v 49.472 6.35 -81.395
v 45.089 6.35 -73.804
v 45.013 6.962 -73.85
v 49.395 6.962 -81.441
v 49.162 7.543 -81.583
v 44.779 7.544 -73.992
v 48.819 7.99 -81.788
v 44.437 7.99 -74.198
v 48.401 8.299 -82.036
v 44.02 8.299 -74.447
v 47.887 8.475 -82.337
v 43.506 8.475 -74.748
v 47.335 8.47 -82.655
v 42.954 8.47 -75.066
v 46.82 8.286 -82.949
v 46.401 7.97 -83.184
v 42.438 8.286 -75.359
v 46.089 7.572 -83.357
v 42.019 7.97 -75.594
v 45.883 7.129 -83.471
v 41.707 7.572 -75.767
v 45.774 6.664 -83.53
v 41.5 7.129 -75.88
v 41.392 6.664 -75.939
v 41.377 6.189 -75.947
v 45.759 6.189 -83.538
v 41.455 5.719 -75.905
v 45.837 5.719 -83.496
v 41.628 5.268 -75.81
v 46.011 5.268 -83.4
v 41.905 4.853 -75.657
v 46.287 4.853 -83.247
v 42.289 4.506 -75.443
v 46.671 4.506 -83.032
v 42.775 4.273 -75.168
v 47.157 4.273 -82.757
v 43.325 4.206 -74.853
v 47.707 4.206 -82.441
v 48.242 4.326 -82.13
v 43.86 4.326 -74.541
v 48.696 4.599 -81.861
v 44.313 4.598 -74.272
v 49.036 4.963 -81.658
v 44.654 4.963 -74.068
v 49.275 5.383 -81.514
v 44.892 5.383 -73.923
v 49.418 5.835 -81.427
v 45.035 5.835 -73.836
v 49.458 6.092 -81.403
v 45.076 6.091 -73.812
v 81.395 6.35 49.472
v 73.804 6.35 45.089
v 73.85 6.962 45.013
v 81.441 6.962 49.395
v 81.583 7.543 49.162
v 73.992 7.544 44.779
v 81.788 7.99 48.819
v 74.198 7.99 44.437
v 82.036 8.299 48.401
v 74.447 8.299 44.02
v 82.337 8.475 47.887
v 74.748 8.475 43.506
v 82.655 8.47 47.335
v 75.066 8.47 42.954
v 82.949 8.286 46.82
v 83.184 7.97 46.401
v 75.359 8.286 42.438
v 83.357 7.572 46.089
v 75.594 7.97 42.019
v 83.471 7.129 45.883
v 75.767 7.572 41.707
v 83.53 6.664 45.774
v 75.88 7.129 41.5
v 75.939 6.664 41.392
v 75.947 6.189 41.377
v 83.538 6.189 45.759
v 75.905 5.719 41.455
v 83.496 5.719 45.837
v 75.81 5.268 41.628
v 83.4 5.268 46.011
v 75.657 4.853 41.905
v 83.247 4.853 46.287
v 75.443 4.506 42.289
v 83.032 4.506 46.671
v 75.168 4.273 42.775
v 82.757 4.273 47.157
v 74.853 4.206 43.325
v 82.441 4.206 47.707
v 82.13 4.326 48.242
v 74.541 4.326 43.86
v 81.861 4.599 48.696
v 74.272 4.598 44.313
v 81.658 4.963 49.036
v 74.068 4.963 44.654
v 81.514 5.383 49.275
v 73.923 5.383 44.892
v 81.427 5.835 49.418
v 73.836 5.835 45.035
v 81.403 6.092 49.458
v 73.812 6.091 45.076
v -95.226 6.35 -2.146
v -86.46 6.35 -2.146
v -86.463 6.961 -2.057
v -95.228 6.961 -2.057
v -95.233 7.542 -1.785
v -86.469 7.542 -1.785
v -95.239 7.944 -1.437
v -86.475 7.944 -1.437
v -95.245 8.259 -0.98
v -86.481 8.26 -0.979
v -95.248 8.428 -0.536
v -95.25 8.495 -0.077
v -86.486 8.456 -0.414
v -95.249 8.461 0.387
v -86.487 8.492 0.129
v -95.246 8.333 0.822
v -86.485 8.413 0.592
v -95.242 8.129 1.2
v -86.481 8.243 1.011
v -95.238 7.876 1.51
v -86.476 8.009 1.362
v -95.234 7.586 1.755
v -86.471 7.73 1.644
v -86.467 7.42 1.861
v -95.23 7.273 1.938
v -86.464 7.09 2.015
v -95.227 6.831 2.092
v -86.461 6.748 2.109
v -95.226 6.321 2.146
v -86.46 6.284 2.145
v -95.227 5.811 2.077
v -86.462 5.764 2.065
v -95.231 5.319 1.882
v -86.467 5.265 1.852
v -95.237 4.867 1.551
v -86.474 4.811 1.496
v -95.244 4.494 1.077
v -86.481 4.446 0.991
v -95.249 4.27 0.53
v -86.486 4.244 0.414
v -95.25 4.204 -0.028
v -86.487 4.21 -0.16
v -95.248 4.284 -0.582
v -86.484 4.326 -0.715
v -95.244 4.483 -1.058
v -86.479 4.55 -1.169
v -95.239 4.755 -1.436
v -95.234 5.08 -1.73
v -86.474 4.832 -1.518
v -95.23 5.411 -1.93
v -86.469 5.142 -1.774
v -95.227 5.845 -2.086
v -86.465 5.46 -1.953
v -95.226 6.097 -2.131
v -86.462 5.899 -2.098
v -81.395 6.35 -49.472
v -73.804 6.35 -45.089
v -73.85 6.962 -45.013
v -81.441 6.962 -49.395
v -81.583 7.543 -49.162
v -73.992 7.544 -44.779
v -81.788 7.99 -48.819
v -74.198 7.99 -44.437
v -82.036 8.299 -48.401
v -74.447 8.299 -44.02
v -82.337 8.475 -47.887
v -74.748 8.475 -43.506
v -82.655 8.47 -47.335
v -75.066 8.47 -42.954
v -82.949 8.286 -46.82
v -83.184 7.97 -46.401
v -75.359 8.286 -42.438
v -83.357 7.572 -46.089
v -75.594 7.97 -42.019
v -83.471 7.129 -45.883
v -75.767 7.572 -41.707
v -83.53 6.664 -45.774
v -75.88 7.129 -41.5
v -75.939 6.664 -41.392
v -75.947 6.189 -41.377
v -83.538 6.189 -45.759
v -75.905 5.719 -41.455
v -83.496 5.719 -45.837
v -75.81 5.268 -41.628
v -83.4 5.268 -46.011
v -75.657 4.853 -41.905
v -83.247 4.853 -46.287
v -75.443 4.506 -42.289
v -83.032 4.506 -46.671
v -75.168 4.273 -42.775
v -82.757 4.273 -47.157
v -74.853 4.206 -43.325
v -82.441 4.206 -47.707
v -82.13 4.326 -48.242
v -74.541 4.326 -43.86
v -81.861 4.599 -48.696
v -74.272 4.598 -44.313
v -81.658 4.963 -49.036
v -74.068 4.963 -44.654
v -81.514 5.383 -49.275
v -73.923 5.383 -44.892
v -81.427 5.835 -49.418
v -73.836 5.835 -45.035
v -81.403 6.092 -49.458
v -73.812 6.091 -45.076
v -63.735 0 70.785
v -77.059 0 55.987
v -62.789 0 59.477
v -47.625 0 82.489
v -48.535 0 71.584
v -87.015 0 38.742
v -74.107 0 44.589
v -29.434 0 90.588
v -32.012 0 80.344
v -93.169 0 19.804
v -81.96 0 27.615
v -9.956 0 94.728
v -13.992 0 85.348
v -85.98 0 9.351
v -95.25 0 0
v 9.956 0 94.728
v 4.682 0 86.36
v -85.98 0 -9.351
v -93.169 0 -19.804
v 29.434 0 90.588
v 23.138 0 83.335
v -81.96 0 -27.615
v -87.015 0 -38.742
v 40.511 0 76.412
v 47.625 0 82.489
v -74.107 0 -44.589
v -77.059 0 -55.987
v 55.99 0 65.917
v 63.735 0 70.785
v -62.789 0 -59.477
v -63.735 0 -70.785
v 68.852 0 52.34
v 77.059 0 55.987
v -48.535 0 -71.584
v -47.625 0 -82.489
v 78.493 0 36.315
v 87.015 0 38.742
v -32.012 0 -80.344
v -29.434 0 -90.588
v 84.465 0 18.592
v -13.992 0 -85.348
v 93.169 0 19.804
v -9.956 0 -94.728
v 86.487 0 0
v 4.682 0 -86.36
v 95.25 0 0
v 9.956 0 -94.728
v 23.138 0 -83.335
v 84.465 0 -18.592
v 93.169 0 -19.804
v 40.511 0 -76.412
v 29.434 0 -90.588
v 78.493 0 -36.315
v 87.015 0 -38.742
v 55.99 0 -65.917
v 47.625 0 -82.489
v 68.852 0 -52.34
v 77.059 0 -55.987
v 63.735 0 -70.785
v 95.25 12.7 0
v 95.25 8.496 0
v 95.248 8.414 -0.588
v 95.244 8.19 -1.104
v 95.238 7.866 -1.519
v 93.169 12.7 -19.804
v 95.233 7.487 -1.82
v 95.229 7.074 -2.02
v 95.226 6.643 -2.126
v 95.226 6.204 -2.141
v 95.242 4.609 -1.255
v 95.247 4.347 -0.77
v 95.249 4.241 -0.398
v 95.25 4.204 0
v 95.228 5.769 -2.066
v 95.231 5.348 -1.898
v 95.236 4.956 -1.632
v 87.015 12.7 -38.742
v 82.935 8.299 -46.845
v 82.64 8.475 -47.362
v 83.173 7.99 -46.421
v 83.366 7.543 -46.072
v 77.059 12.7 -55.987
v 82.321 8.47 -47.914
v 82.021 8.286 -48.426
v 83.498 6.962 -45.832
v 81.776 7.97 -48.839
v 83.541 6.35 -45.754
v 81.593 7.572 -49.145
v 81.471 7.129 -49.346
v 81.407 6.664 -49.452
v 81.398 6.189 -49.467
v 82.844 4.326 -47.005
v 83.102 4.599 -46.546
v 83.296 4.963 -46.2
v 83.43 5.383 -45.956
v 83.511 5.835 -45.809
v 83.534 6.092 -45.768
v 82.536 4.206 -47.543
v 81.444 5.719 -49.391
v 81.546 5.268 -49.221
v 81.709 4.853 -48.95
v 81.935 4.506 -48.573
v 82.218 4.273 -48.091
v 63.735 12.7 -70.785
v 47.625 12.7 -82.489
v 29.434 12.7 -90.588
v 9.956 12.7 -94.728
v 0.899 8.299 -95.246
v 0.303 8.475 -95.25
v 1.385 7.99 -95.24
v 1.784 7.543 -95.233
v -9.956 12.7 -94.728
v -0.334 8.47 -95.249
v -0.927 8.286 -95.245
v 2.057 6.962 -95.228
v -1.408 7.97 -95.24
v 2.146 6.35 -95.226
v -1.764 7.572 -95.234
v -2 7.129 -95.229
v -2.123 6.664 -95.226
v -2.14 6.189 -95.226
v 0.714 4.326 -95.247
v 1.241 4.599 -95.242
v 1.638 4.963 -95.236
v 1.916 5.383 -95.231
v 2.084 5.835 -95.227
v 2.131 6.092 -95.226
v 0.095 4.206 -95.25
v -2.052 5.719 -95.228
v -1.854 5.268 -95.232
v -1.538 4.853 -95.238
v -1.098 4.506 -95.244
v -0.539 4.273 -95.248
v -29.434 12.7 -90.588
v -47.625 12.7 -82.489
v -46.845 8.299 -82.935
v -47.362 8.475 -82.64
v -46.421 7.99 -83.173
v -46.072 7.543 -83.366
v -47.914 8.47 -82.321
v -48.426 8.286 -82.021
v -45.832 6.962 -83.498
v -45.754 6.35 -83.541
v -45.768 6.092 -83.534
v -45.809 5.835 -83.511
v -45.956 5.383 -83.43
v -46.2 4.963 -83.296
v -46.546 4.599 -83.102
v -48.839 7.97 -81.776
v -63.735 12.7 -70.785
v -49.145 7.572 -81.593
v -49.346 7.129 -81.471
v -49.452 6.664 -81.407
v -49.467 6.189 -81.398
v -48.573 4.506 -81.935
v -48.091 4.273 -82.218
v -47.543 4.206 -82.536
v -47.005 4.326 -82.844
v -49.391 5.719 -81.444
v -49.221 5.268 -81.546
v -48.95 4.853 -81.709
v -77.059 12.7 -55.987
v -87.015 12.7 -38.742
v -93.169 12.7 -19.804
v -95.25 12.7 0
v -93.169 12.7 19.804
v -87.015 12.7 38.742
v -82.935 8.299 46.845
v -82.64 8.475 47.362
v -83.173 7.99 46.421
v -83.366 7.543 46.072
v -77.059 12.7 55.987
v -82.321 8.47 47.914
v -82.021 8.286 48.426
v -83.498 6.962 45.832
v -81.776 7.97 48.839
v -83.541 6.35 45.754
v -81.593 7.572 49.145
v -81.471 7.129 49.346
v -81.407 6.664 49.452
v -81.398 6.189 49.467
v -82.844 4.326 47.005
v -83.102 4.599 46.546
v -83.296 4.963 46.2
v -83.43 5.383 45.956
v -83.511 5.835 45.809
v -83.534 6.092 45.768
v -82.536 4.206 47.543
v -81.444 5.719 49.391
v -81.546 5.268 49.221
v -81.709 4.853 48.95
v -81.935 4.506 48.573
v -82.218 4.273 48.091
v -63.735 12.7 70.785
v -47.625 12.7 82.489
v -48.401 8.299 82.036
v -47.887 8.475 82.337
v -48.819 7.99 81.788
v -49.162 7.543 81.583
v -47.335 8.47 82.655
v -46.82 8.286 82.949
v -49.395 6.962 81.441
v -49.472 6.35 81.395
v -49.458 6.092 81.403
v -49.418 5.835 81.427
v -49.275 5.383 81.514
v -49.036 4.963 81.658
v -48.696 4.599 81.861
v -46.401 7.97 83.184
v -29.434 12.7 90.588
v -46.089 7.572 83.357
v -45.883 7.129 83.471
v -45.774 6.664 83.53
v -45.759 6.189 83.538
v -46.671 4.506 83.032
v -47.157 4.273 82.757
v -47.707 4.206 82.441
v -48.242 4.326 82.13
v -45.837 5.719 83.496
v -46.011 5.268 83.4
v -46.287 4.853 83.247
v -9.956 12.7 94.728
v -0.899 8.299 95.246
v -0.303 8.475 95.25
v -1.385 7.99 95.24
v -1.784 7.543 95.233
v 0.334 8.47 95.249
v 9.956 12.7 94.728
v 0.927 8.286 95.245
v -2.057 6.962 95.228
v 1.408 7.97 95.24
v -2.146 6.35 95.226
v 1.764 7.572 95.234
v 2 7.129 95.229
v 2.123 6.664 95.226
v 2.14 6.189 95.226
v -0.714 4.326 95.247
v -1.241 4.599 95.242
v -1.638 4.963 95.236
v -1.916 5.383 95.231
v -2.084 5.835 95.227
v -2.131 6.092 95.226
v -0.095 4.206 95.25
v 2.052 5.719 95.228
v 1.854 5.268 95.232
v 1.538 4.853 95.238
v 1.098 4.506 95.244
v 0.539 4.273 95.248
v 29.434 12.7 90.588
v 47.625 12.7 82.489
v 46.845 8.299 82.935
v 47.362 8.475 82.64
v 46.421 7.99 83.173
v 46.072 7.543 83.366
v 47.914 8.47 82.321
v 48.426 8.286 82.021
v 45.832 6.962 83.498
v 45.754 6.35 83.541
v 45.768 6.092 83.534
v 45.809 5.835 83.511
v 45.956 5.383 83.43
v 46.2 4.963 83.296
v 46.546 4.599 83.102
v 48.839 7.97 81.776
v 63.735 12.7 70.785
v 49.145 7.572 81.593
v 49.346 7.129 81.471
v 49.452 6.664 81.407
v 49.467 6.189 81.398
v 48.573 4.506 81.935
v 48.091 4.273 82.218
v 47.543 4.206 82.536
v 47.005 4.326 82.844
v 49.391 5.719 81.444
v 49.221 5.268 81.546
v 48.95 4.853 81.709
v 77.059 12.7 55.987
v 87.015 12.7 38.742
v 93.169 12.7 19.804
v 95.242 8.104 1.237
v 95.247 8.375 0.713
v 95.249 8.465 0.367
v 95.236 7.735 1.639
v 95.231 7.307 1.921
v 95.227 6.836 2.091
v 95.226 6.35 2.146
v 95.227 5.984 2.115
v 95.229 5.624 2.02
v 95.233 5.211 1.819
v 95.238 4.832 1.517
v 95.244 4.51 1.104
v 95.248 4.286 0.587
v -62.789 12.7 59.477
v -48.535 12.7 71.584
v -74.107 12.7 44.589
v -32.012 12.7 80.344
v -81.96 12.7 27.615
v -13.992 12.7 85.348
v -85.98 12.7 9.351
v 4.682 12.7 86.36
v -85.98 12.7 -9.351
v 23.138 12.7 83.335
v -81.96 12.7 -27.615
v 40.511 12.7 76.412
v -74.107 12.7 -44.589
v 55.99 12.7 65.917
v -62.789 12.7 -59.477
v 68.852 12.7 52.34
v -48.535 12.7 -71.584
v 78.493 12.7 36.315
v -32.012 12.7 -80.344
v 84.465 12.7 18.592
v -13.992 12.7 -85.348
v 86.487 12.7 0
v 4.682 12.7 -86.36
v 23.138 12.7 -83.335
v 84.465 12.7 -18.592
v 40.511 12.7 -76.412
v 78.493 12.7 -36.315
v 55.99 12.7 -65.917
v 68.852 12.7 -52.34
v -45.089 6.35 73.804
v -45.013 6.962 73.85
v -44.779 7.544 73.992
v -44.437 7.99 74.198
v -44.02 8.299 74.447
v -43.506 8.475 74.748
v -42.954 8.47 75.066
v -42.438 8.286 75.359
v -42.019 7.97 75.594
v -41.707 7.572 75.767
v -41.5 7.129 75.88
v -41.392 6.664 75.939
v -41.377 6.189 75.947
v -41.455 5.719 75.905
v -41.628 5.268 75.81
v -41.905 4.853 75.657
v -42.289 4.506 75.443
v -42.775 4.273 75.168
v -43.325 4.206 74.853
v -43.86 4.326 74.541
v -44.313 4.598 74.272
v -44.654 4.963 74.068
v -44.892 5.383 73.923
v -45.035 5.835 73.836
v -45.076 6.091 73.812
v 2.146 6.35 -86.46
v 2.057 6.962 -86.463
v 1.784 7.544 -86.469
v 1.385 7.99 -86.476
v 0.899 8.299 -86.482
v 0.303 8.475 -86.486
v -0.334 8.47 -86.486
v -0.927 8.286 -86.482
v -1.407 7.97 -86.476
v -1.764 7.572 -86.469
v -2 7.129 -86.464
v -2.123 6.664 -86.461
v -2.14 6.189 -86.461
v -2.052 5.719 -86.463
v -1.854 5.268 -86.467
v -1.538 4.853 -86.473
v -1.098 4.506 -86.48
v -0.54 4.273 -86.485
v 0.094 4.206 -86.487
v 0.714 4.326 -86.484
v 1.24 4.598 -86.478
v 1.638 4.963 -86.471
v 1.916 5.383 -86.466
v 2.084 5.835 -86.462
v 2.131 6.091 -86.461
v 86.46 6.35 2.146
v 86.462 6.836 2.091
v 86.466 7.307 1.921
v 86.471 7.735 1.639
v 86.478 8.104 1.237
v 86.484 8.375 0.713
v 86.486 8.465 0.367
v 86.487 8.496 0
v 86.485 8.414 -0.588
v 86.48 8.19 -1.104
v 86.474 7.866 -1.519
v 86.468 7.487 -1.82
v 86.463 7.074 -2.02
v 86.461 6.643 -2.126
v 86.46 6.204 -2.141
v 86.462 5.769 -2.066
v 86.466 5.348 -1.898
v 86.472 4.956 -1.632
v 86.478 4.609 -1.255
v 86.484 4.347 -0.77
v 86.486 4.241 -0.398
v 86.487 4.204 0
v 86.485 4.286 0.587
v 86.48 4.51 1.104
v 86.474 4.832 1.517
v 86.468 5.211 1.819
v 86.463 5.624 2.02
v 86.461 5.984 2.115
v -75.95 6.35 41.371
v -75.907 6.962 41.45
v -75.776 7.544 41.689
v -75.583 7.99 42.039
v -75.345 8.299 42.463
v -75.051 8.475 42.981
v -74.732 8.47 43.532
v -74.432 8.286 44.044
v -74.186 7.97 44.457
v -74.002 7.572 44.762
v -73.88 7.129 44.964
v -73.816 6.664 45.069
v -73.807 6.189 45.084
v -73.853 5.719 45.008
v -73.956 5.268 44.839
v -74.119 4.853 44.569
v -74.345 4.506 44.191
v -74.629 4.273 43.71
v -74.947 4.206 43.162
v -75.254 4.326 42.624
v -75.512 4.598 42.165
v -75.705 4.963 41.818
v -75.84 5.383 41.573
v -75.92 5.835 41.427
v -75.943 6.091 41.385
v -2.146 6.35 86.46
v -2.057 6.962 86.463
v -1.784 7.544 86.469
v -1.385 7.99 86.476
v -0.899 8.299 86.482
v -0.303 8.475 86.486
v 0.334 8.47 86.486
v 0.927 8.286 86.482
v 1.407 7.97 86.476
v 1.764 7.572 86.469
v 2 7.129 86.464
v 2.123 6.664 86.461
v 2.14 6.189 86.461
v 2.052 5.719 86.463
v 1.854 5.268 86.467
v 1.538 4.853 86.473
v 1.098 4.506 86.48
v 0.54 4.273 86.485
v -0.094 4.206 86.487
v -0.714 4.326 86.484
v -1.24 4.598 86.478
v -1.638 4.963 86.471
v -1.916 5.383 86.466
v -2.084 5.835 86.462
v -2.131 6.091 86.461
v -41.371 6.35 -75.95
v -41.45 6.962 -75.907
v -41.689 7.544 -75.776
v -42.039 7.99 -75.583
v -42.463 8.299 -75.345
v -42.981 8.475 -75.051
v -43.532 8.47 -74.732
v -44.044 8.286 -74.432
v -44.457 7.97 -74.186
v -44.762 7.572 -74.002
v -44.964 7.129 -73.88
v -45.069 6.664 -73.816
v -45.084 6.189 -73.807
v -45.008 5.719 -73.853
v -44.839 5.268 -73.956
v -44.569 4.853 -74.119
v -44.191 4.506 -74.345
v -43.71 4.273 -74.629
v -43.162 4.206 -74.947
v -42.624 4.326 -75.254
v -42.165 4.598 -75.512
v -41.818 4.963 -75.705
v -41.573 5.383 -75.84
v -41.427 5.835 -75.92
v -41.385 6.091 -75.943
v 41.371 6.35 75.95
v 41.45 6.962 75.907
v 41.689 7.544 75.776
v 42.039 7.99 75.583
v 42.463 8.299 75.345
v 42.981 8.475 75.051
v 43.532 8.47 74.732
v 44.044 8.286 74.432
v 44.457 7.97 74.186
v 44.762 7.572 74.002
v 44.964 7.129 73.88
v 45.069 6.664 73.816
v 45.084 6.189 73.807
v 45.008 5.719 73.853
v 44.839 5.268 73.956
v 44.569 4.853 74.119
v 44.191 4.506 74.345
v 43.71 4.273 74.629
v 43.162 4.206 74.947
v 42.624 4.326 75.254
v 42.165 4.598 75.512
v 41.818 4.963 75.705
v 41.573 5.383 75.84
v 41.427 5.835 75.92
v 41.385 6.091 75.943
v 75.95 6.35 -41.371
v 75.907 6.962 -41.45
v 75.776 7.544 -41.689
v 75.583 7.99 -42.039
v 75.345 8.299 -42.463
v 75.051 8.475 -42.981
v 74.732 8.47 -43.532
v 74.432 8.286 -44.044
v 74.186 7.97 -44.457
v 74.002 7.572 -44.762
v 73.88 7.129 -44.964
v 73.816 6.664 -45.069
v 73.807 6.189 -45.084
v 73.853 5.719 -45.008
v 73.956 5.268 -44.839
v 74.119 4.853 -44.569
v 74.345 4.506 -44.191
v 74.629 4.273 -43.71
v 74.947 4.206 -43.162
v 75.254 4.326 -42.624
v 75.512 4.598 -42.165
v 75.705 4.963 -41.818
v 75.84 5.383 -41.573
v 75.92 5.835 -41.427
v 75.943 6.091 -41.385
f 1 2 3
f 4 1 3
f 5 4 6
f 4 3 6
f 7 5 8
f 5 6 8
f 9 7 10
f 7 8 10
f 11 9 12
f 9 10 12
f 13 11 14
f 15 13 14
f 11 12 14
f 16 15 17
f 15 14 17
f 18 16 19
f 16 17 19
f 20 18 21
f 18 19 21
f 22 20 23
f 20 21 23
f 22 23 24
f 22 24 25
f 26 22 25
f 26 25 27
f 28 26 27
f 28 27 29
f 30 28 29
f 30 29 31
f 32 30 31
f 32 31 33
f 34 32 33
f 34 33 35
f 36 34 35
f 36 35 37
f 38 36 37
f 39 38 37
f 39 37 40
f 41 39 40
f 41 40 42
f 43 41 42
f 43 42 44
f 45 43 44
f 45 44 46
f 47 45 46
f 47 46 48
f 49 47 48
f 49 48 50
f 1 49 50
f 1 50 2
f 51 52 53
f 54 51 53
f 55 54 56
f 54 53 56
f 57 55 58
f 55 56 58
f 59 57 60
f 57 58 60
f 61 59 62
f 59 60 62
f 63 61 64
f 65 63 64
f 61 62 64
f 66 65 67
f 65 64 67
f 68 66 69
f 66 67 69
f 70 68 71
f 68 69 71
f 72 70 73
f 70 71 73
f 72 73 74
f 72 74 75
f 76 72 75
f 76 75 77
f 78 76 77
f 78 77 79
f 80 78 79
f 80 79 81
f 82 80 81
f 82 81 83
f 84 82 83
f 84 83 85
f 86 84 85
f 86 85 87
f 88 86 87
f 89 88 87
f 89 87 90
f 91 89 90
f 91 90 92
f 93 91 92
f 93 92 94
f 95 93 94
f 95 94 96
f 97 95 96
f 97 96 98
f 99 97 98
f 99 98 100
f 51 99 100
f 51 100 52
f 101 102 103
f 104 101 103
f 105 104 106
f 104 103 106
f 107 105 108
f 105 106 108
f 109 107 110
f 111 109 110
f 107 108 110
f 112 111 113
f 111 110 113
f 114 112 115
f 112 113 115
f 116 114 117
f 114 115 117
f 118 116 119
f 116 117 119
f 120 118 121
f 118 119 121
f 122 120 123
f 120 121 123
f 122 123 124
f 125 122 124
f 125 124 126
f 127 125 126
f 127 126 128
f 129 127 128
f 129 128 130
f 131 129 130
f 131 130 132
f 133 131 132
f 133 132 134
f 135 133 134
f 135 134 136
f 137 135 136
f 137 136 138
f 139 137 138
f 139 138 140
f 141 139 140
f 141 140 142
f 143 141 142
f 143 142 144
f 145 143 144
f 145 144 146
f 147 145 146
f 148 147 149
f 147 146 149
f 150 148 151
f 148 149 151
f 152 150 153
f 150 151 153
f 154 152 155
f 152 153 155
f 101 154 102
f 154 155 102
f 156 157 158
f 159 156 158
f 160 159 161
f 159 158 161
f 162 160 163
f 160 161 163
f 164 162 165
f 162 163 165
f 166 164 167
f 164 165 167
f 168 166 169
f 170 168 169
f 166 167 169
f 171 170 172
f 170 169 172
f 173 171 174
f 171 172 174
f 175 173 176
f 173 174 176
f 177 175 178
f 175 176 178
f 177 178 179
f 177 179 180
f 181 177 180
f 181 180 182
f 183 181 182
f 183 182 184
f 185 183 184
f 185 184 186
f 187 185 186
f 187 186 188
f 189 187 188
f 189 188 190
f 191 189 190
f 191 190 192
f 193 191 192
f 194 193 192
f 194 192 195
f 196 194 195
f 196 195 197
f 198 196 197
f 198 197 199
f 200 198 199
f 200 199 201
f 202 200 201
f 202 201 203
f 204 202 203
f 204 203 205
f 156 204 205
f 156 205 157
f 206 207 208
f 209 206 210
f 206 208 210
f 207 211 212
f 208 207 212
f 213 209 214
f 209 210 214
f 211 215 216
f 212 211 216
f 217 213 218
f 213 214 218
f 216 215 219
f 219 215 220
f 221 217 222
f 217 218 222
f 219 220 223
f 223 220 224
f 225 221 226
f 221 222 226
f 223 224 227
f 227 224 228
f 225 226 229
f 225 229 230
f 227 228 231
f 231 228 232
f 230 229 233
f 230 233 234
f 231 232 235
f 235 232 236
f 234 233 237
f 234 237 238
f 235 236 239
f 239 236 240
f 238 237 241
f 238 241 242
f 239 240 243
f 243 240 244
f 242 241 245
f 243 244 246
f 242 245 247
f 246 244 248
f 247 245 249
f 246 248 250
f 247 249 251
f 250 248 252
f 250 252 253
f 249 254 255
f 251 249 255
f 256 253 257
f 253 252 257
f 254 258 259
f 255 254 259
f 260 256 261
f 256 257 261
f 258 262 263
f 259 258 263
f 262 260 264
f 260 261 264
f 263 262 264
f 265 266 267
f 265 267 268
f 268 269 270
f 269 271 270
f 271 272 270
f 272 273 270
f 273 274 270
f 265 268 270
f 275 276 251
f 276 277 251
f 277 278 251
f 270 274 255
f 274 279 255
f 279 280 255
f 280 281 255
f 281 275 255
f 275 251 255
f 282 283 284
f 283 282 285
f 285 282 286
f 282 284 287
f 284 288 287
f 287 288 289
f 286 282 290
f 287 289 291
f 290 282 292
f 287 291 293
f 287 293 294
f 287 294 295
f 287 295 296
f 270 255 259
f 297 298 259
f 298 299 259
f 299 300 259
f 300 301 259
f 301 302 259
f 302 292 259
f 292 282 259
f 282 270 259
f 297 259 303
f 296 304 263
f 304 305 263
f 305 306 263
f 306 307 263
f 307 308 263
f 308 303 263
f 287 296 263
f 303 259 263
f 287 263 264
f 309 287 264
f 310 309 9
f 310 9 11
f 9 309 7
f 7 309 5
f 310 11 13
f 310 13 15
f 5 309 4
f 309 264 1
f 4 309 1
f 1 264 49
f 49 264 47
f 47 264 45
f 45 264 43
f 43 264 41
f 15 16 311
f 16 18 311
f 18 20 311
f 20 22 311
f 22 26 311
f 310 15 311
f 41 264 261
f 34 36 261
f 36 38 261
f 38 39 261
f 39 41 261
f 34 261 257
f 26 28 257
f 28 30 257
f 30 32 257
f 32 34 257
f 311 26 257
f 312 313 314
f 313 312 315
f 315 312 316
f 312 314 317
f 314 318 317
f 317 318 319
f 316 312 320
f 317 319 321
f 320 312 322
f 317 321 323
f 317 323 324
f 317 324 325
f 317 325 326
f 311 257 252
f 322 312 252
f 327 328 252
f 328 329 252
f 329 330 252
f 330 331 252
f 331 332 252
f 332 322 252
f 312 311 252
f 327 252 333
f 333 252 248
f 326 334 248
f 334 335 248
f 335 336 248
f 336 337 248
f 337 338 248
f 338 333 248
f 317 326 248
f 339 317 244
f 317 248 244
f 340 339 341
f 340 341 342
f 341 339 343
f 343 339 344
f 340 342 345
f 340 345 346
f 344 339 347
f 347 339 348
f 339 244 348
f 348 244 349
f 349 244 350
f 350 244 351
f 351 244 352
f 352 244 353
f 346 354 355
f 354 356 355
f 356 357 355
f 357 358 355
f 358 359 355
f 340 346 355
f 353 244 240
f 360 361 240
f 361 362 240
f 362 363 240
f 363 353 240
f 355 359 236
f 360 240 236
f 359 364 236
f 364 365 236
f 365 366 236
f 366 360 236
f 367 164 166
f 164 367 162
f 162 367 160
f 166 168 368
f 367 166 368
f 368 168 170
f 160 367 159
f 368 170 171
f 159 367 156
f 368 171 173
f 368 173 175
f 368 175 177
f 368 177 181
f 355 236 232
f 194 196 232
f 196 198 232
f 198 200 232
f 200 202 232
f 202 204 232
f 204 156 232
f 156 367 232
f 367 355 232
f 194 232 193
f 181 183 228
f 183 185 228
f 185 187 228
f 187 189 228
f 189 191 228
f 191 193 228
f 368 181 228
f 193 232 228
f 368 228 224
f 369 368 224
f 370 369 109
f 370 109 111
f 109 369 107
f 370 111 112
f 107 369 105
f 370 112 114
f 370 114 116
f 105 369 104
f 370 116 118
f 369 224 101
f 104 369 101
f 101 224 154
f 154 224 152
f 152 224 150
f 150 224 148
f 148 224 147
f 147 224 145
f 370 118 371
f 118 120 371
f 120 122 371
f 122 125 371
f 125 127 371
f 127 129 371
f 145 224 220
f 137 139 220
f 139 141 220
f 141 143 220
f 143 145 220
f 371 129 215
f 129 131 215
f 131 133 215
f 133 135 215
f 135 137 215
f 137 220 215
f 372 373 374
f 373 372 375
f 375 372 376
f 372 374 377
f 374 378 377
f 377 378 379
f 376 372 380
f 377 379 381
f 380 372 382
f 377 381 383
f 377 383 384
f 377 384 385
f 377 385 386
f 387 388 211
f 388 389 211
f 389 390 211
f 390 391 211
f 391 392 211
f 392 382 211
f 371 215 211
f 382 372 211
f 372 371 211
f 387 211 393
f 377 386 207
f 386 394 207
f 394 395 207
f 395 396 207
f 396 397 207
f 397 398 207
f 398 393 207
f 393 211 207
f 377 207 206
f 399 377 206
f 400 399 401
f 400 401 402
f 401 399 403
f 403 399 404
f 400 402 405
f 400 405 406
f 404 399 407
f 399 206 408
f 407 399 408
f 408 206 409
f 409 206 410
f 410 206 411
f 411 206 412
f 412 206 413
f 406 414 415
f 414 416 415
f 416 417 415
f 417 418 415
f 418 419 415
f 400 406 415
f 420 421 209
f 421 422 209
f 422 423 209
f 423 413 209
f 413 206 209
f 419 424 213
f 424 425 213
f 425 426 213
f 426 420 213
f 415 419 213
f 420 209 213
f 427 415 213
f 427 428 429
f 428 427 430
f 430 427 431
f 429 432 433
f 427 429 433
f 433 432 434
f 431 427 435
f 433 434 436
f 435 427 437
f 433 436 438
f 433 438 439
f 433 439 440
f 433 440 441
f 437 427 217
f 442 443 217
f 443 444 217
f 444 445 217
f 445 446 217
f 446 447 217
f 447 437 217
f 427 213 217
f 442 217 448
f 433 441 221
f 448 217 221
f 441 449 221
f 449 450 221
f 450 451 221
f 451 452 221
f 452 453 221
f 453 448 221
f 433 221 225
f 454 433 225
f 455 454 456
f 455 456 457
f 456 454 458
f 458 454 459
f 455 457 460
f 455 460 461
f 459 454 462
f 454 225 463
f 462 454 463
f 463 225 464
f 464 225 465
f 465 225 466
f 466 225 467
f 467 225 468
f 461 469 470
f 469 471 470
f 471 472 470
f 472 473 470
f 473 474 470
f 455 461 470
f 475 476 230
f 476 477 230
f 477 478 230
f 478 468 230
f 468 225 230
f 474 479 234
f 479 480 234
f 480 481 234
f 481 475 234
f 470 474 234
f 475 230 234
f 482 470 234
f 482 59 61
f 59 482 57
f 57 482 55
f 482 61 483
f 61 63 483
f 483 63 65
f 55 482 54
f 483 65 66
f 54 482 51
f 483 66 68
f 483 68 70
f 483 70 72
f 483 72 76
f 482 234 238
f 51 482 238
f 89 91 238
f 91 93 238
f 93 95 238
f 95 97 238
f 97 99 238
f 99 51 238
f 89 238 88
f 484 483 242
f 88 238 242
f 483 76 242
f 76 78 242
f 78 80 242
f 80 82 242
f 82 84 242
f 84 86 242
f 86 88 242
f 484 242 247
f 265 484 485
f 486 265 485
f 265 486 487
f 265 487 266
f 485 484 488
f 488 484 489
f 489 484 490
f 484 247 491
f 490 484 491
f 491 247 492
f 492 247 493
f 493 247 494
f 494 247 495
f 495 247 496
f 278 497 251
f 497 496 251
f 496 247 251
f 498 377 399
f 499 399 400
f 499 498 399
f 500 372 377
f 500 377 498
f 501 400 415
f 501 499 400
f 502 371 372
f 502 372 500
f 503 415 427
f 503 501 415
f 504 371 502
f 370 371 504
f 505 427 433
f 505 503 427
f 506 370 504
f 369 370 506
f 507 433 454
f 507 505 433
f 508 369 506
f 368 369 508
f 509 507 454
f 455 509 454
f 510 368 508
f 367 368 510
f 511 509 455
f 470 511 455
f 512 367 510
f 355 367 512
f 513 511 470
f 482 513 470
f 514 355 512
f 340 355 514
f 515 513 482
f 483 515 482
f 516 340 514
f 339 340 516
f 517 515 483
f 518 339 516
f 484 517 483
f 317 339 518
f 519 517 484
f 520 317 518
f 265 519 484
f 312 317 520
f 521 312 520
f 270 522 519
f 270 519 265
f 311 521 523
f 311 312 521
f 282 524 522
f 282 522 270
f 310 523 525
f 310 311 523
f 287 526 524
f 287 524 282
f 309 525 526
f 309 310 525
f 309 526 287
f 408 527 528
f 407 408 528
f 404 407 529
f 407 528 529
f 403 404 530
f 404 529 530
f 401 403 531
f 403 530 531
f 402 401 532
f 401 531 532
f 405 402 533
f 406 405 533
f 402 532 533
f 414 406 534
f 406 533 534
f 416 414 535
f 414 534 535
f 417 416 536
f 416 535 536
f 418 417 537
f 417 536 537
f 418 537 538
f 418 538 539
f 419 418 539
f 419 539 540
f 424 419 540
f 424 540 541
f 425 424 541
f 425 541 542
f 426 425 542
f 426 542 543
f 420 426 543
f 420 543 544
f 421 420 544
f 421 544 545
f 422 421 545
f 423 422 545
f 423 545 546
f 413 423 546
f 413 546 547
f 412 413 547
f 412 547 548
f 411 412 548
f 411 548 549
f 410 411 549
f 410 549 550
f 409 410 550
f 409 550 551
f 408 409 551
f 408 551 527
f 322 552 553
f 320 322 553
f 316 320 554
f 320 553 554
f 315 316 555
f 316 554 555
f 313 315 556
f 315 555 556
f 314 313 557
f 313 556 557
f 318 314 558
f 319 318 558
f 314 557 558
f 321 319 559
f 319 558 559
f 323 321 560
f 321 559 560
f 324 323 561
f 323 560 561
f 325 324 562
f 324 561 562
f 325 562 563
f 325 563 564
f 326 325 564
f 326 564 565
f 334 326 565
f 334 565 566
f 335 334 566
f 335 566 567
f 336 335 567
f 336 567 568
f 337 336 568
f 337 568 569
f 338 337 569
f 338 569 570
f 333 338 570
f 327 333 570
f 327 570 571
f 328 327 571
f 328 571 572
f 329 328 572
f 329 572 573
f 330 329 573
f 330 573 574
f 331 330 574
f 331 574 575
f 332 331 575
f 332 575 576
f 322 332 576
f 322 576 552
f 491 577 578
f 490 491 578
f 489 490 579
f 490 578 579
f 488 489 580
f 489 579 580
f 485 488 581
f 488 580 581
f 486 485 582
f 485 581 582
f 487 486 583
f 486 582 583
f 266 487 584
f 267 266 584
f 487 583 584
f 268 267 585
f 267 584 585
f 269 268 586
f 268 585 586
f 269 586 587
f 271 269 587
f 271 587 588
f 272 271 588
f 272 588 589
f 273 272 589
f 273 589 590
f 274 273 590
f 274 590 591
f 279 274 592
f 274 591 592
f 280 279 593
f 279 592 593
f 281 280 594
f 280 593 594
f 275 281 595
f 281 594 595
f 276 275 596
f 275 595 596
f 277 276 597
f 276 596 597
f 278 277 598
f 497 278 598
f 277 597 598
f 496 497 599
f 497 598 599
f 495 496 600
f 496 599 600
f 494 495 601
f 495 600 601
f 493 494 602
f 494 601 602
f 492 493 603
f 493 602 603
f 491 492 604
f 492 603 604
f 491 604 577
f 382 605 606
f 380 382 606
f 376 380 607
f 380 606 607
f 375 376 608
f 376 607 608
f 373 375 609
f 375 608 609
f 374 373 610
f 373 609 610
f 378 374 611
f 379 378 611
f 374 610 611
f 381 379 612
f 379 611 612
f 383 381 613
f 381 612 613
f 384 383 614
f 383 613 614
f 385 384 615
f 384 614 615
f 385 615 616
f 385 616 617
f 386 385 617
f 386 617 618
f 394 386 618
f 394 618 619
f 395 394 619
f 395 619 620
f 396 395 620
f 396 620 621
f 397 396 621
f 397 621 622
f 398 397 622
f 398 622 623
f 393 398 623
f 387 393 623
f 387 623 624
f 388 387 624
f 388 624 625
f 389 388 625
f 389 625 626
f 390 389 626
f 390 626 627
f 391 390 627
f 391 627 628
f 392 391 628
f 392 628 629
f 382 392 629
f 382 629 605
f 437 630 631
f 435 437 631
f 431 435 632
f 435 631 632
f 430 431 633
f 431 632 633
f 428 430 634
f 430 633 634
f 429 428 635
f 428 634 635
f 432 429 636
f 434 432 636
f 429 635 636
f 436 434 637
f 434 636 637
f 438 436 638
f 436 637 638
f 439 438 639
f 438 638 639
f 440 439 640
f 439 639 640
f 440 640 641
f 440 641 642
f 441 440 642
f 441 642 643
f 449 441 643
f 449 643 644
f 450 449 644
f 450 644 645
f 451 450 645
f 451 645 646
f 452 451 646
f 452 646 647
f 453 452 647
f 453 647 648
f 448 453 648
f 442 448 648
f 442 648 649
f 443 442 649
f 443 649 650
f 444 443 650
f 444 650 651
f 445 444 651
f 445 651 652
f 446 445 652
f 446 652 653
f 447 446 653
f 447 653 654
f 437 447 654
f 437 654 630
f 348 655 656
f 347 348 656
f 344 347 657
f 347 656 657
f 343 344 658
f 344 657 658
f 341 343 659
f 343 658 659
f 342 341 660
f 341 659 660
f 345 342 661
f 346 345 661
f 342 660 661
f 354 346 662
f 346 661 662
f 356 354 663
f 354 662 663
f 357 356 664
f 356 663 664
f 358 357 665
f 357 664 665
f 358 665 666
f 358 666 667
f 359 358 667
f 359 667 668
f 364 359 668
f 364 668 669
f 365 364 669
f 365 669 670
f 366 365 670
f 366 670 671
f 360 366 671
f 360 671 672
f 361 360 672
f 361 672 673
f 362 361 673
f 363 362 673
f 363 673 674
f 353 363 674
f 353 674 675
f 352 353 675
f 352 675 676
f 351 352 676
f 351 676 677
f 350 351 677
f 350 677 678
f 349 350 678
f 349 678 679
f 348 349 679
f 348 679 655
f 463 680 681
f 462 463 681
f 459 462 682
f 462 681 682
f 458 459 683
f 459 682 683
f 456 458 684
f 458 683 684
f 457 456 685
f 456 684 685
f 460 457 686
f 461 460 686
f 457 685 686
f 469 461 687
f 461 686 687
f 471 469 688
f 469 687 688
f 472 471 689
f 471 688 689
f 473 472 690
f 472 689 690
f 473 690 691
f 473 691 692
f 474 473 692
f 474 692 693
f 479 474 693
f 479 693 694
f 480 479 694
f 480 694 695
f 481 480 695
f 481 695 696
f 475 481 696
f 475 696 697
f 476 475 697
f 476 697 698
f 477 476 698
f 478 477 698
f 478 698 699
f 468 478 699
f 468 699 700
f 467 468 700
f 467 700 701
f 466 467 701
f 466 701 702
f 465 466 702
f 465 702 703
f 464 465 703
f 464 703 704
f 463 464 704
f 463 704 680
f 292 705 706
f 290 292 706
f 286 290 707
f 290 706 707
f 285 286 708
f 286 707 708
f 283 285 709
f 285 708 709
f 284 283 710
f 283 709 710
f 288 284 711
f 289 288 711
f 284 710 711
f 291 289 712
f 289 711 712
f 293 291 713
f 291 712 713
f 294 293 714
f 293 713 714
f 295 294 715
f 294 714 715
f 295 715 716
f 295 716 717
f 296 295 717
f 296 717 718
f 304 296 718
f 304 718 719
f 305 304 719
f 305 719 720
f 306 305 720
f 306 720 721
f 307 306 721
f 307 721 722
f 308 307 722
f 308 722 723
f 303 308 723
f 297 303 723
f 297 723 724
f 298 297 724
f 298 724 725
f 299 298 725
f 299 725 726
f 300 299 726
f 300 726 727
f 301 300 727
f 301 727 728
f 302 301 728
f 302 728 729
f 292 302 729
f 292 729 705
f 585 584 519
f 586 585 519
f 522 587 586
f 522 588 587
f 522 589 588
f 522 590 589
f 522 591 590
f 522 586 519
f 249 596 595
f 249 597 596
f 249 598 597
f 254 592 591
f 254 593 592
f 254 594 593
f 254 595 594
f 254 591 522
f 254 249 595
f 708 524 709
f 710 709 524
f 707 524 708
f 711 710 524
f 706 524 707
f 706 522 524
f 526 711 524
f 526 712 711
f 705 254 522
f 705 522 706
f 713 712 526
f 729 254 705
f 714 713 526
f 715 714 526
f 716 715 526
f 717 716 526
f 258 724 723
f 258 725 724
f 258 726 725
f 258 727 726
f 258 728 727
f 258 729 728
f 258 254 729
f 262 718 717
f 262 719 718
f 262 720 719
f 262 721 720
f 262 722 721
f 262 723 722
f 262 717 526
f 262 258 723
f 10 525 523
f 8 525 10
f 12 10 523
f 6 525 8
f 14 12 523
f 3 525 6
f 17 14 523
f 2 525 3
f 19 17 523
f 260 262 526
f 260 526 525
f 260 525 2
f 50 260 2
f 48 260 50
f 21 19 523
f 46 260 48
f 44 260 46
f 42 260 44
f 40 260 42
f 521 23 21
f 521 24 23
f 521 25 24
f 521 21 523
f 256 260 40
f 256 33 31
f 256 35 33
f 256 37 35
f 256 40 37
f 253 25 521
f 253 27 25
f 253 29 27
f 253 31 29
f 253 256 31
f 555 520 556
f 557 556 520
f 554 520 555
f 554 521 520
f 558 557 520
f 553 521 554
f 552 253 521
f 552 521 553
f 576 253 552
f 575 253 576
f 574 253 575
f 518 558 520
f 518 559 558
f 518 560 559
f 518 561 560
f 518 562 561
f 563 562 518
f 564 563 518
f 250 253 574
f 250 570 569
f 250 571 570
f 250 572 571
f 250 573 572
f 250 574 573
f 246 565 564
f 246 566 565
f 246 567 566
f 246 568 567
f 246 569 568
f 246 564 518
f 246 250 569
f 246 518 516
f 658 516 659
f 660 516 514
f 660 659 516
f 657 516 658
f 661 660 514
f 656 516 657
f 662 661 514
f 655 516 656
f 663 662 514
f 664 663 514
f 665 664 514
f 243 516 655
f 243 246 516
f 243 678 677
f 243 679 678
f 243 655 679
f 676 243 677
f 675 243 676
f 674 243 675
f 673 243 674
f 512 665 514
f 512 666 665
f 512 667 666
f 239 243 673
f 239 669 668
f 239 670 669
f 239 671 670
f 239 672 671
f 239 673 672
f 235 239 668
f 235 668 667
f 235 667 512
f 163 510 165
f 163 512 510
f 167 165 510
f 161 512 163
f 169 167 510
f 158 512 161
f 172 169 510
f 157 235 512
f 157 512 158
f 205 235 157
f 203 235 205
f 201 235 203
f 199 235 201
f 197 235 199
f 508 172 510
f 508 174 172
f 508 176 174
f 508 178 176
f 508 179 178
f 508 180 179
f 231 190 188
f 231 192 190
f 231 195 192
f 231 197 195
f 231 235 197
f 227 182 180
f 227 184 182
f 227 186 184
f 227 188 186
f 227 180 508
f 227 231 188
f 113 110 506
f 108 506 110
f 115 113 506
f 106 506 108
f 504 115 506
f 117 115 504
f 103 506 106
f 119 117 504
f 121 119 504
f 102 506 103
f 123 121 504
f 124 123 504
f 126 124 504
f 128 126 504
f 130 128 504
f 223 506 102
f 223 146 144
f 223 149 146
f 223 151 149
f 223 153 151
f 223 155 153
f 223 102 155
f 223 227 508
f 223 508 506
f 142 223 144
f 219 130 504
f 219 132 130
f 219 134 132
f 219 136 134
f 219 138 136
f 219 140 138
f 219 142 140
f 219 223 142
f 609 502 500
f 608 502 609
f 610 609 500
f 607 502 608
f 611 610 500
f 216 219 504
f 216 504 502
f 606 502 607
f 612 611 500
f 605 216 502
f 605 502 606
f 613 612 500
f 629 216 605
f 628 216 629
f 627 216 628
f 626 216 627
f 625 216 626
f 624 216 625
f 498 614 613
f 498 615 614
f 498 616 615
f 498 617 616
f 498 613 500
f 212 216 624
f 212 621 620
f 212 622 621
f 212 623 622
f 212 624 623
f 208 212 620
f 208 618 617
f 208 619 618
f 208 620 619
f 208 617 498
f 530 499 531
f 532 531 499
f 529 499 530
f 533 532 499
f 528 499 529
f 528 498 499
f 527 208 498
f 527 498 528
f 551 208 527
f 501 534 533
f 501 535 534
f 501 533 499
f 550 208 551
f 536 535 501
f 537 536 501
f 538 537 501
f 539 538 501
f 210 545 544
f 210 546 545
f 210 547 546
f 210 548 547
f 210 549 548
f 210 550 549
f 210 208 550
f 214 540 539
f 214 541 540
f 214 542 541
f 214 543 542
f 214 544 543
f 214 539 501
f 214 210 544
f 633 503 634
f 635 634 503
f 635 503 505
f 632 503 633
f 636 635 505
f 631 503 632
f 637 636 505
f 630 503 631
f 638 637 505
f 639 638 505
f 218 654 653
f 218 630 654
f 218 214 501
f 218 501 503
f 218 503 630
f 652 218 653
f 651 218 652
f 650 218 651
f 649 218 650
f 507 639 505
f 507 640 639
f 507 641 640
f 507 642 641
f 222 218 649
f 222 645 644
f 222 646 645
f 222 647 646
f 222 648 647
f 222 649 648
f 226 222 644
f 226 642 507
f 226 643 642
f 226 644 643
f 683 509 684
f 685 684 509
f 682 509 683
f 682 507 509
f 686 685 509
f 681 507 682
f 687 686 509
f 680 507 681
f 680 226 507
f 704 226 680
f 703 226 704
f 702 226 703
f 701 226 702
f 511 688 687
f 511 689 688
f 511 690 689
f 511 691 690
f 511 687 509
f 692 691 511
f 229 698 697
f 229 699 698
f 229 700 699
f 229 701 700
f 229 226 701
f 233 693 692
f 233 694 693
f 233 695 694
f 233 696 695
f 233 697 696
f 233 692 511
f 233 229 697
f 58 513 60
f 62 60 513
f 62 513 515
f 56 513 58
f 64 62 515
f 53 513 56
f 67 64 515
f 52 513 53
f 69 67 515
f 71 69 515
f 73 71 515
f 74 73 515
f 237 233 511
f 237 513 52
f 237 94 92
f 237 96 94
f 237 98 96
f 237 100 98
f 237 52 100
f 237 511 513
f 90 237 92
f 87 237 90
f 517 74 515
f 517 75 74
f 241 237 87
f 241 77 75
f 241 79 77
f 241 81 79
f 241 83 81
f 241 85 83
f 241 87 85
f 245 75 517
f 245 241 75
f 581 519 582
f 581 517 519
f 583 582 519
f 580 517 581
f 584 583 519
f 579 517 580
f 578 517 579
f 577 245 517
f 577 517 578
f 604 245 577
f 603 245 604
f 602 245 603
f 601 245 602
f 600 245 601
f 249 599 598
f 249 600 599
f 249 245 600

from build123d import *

# Parameters (mm, degrees)
SKETCH1_R           = 95.25
SKETCH1_R_2         = 86.487
BOSS_EXTRUDE1_DEPTH = 12.7
SKETCH3_R           = 2.1463
CUT_EXTRUDE2_DEPTH  = 254
CIRPATTERN1_COUNT   = 12


with BuildPart() as part:
    # Sketch1 → Boss-Extrude1 (new body)
    with BuildSketch(Plane(origin=(0, 0, 0), x_dir=(1, 0, 0), z_dir=(0, 1, 0))):
        Circle(SKETCH1_R)
        Circle(SKETCH1_R_2, mode=Mode.SUBTRACT)
    extrude(amount=BOSS_EXTRUDE1_DEPTH)

    # Sketch3 → Cut-Extrude2 (cut)
    with BuildSketch(Plane.XY):
        with Locations((0, 6.35)):
            Circle(SKETCH3_R)
    cut_extrude2 = extrude(amount=-CUT_EXTRUDE2_DEPTH, mode=Mode.SUBTRACT)

    # CirPattern1: Cut-Extrude2 ×12 about axis
    cirpattern1_axis = Axis((0, 12.7, 0), (0, 1, 0))
    for i in range(1, CIRPATTERN1_COUNT):
        add(cut_extrude2.rotate(cirpattern1_axis, i * 360 / CIRPATTERN1_COUNT), mode=Mode.SUBTRACT)


solid = part.part
